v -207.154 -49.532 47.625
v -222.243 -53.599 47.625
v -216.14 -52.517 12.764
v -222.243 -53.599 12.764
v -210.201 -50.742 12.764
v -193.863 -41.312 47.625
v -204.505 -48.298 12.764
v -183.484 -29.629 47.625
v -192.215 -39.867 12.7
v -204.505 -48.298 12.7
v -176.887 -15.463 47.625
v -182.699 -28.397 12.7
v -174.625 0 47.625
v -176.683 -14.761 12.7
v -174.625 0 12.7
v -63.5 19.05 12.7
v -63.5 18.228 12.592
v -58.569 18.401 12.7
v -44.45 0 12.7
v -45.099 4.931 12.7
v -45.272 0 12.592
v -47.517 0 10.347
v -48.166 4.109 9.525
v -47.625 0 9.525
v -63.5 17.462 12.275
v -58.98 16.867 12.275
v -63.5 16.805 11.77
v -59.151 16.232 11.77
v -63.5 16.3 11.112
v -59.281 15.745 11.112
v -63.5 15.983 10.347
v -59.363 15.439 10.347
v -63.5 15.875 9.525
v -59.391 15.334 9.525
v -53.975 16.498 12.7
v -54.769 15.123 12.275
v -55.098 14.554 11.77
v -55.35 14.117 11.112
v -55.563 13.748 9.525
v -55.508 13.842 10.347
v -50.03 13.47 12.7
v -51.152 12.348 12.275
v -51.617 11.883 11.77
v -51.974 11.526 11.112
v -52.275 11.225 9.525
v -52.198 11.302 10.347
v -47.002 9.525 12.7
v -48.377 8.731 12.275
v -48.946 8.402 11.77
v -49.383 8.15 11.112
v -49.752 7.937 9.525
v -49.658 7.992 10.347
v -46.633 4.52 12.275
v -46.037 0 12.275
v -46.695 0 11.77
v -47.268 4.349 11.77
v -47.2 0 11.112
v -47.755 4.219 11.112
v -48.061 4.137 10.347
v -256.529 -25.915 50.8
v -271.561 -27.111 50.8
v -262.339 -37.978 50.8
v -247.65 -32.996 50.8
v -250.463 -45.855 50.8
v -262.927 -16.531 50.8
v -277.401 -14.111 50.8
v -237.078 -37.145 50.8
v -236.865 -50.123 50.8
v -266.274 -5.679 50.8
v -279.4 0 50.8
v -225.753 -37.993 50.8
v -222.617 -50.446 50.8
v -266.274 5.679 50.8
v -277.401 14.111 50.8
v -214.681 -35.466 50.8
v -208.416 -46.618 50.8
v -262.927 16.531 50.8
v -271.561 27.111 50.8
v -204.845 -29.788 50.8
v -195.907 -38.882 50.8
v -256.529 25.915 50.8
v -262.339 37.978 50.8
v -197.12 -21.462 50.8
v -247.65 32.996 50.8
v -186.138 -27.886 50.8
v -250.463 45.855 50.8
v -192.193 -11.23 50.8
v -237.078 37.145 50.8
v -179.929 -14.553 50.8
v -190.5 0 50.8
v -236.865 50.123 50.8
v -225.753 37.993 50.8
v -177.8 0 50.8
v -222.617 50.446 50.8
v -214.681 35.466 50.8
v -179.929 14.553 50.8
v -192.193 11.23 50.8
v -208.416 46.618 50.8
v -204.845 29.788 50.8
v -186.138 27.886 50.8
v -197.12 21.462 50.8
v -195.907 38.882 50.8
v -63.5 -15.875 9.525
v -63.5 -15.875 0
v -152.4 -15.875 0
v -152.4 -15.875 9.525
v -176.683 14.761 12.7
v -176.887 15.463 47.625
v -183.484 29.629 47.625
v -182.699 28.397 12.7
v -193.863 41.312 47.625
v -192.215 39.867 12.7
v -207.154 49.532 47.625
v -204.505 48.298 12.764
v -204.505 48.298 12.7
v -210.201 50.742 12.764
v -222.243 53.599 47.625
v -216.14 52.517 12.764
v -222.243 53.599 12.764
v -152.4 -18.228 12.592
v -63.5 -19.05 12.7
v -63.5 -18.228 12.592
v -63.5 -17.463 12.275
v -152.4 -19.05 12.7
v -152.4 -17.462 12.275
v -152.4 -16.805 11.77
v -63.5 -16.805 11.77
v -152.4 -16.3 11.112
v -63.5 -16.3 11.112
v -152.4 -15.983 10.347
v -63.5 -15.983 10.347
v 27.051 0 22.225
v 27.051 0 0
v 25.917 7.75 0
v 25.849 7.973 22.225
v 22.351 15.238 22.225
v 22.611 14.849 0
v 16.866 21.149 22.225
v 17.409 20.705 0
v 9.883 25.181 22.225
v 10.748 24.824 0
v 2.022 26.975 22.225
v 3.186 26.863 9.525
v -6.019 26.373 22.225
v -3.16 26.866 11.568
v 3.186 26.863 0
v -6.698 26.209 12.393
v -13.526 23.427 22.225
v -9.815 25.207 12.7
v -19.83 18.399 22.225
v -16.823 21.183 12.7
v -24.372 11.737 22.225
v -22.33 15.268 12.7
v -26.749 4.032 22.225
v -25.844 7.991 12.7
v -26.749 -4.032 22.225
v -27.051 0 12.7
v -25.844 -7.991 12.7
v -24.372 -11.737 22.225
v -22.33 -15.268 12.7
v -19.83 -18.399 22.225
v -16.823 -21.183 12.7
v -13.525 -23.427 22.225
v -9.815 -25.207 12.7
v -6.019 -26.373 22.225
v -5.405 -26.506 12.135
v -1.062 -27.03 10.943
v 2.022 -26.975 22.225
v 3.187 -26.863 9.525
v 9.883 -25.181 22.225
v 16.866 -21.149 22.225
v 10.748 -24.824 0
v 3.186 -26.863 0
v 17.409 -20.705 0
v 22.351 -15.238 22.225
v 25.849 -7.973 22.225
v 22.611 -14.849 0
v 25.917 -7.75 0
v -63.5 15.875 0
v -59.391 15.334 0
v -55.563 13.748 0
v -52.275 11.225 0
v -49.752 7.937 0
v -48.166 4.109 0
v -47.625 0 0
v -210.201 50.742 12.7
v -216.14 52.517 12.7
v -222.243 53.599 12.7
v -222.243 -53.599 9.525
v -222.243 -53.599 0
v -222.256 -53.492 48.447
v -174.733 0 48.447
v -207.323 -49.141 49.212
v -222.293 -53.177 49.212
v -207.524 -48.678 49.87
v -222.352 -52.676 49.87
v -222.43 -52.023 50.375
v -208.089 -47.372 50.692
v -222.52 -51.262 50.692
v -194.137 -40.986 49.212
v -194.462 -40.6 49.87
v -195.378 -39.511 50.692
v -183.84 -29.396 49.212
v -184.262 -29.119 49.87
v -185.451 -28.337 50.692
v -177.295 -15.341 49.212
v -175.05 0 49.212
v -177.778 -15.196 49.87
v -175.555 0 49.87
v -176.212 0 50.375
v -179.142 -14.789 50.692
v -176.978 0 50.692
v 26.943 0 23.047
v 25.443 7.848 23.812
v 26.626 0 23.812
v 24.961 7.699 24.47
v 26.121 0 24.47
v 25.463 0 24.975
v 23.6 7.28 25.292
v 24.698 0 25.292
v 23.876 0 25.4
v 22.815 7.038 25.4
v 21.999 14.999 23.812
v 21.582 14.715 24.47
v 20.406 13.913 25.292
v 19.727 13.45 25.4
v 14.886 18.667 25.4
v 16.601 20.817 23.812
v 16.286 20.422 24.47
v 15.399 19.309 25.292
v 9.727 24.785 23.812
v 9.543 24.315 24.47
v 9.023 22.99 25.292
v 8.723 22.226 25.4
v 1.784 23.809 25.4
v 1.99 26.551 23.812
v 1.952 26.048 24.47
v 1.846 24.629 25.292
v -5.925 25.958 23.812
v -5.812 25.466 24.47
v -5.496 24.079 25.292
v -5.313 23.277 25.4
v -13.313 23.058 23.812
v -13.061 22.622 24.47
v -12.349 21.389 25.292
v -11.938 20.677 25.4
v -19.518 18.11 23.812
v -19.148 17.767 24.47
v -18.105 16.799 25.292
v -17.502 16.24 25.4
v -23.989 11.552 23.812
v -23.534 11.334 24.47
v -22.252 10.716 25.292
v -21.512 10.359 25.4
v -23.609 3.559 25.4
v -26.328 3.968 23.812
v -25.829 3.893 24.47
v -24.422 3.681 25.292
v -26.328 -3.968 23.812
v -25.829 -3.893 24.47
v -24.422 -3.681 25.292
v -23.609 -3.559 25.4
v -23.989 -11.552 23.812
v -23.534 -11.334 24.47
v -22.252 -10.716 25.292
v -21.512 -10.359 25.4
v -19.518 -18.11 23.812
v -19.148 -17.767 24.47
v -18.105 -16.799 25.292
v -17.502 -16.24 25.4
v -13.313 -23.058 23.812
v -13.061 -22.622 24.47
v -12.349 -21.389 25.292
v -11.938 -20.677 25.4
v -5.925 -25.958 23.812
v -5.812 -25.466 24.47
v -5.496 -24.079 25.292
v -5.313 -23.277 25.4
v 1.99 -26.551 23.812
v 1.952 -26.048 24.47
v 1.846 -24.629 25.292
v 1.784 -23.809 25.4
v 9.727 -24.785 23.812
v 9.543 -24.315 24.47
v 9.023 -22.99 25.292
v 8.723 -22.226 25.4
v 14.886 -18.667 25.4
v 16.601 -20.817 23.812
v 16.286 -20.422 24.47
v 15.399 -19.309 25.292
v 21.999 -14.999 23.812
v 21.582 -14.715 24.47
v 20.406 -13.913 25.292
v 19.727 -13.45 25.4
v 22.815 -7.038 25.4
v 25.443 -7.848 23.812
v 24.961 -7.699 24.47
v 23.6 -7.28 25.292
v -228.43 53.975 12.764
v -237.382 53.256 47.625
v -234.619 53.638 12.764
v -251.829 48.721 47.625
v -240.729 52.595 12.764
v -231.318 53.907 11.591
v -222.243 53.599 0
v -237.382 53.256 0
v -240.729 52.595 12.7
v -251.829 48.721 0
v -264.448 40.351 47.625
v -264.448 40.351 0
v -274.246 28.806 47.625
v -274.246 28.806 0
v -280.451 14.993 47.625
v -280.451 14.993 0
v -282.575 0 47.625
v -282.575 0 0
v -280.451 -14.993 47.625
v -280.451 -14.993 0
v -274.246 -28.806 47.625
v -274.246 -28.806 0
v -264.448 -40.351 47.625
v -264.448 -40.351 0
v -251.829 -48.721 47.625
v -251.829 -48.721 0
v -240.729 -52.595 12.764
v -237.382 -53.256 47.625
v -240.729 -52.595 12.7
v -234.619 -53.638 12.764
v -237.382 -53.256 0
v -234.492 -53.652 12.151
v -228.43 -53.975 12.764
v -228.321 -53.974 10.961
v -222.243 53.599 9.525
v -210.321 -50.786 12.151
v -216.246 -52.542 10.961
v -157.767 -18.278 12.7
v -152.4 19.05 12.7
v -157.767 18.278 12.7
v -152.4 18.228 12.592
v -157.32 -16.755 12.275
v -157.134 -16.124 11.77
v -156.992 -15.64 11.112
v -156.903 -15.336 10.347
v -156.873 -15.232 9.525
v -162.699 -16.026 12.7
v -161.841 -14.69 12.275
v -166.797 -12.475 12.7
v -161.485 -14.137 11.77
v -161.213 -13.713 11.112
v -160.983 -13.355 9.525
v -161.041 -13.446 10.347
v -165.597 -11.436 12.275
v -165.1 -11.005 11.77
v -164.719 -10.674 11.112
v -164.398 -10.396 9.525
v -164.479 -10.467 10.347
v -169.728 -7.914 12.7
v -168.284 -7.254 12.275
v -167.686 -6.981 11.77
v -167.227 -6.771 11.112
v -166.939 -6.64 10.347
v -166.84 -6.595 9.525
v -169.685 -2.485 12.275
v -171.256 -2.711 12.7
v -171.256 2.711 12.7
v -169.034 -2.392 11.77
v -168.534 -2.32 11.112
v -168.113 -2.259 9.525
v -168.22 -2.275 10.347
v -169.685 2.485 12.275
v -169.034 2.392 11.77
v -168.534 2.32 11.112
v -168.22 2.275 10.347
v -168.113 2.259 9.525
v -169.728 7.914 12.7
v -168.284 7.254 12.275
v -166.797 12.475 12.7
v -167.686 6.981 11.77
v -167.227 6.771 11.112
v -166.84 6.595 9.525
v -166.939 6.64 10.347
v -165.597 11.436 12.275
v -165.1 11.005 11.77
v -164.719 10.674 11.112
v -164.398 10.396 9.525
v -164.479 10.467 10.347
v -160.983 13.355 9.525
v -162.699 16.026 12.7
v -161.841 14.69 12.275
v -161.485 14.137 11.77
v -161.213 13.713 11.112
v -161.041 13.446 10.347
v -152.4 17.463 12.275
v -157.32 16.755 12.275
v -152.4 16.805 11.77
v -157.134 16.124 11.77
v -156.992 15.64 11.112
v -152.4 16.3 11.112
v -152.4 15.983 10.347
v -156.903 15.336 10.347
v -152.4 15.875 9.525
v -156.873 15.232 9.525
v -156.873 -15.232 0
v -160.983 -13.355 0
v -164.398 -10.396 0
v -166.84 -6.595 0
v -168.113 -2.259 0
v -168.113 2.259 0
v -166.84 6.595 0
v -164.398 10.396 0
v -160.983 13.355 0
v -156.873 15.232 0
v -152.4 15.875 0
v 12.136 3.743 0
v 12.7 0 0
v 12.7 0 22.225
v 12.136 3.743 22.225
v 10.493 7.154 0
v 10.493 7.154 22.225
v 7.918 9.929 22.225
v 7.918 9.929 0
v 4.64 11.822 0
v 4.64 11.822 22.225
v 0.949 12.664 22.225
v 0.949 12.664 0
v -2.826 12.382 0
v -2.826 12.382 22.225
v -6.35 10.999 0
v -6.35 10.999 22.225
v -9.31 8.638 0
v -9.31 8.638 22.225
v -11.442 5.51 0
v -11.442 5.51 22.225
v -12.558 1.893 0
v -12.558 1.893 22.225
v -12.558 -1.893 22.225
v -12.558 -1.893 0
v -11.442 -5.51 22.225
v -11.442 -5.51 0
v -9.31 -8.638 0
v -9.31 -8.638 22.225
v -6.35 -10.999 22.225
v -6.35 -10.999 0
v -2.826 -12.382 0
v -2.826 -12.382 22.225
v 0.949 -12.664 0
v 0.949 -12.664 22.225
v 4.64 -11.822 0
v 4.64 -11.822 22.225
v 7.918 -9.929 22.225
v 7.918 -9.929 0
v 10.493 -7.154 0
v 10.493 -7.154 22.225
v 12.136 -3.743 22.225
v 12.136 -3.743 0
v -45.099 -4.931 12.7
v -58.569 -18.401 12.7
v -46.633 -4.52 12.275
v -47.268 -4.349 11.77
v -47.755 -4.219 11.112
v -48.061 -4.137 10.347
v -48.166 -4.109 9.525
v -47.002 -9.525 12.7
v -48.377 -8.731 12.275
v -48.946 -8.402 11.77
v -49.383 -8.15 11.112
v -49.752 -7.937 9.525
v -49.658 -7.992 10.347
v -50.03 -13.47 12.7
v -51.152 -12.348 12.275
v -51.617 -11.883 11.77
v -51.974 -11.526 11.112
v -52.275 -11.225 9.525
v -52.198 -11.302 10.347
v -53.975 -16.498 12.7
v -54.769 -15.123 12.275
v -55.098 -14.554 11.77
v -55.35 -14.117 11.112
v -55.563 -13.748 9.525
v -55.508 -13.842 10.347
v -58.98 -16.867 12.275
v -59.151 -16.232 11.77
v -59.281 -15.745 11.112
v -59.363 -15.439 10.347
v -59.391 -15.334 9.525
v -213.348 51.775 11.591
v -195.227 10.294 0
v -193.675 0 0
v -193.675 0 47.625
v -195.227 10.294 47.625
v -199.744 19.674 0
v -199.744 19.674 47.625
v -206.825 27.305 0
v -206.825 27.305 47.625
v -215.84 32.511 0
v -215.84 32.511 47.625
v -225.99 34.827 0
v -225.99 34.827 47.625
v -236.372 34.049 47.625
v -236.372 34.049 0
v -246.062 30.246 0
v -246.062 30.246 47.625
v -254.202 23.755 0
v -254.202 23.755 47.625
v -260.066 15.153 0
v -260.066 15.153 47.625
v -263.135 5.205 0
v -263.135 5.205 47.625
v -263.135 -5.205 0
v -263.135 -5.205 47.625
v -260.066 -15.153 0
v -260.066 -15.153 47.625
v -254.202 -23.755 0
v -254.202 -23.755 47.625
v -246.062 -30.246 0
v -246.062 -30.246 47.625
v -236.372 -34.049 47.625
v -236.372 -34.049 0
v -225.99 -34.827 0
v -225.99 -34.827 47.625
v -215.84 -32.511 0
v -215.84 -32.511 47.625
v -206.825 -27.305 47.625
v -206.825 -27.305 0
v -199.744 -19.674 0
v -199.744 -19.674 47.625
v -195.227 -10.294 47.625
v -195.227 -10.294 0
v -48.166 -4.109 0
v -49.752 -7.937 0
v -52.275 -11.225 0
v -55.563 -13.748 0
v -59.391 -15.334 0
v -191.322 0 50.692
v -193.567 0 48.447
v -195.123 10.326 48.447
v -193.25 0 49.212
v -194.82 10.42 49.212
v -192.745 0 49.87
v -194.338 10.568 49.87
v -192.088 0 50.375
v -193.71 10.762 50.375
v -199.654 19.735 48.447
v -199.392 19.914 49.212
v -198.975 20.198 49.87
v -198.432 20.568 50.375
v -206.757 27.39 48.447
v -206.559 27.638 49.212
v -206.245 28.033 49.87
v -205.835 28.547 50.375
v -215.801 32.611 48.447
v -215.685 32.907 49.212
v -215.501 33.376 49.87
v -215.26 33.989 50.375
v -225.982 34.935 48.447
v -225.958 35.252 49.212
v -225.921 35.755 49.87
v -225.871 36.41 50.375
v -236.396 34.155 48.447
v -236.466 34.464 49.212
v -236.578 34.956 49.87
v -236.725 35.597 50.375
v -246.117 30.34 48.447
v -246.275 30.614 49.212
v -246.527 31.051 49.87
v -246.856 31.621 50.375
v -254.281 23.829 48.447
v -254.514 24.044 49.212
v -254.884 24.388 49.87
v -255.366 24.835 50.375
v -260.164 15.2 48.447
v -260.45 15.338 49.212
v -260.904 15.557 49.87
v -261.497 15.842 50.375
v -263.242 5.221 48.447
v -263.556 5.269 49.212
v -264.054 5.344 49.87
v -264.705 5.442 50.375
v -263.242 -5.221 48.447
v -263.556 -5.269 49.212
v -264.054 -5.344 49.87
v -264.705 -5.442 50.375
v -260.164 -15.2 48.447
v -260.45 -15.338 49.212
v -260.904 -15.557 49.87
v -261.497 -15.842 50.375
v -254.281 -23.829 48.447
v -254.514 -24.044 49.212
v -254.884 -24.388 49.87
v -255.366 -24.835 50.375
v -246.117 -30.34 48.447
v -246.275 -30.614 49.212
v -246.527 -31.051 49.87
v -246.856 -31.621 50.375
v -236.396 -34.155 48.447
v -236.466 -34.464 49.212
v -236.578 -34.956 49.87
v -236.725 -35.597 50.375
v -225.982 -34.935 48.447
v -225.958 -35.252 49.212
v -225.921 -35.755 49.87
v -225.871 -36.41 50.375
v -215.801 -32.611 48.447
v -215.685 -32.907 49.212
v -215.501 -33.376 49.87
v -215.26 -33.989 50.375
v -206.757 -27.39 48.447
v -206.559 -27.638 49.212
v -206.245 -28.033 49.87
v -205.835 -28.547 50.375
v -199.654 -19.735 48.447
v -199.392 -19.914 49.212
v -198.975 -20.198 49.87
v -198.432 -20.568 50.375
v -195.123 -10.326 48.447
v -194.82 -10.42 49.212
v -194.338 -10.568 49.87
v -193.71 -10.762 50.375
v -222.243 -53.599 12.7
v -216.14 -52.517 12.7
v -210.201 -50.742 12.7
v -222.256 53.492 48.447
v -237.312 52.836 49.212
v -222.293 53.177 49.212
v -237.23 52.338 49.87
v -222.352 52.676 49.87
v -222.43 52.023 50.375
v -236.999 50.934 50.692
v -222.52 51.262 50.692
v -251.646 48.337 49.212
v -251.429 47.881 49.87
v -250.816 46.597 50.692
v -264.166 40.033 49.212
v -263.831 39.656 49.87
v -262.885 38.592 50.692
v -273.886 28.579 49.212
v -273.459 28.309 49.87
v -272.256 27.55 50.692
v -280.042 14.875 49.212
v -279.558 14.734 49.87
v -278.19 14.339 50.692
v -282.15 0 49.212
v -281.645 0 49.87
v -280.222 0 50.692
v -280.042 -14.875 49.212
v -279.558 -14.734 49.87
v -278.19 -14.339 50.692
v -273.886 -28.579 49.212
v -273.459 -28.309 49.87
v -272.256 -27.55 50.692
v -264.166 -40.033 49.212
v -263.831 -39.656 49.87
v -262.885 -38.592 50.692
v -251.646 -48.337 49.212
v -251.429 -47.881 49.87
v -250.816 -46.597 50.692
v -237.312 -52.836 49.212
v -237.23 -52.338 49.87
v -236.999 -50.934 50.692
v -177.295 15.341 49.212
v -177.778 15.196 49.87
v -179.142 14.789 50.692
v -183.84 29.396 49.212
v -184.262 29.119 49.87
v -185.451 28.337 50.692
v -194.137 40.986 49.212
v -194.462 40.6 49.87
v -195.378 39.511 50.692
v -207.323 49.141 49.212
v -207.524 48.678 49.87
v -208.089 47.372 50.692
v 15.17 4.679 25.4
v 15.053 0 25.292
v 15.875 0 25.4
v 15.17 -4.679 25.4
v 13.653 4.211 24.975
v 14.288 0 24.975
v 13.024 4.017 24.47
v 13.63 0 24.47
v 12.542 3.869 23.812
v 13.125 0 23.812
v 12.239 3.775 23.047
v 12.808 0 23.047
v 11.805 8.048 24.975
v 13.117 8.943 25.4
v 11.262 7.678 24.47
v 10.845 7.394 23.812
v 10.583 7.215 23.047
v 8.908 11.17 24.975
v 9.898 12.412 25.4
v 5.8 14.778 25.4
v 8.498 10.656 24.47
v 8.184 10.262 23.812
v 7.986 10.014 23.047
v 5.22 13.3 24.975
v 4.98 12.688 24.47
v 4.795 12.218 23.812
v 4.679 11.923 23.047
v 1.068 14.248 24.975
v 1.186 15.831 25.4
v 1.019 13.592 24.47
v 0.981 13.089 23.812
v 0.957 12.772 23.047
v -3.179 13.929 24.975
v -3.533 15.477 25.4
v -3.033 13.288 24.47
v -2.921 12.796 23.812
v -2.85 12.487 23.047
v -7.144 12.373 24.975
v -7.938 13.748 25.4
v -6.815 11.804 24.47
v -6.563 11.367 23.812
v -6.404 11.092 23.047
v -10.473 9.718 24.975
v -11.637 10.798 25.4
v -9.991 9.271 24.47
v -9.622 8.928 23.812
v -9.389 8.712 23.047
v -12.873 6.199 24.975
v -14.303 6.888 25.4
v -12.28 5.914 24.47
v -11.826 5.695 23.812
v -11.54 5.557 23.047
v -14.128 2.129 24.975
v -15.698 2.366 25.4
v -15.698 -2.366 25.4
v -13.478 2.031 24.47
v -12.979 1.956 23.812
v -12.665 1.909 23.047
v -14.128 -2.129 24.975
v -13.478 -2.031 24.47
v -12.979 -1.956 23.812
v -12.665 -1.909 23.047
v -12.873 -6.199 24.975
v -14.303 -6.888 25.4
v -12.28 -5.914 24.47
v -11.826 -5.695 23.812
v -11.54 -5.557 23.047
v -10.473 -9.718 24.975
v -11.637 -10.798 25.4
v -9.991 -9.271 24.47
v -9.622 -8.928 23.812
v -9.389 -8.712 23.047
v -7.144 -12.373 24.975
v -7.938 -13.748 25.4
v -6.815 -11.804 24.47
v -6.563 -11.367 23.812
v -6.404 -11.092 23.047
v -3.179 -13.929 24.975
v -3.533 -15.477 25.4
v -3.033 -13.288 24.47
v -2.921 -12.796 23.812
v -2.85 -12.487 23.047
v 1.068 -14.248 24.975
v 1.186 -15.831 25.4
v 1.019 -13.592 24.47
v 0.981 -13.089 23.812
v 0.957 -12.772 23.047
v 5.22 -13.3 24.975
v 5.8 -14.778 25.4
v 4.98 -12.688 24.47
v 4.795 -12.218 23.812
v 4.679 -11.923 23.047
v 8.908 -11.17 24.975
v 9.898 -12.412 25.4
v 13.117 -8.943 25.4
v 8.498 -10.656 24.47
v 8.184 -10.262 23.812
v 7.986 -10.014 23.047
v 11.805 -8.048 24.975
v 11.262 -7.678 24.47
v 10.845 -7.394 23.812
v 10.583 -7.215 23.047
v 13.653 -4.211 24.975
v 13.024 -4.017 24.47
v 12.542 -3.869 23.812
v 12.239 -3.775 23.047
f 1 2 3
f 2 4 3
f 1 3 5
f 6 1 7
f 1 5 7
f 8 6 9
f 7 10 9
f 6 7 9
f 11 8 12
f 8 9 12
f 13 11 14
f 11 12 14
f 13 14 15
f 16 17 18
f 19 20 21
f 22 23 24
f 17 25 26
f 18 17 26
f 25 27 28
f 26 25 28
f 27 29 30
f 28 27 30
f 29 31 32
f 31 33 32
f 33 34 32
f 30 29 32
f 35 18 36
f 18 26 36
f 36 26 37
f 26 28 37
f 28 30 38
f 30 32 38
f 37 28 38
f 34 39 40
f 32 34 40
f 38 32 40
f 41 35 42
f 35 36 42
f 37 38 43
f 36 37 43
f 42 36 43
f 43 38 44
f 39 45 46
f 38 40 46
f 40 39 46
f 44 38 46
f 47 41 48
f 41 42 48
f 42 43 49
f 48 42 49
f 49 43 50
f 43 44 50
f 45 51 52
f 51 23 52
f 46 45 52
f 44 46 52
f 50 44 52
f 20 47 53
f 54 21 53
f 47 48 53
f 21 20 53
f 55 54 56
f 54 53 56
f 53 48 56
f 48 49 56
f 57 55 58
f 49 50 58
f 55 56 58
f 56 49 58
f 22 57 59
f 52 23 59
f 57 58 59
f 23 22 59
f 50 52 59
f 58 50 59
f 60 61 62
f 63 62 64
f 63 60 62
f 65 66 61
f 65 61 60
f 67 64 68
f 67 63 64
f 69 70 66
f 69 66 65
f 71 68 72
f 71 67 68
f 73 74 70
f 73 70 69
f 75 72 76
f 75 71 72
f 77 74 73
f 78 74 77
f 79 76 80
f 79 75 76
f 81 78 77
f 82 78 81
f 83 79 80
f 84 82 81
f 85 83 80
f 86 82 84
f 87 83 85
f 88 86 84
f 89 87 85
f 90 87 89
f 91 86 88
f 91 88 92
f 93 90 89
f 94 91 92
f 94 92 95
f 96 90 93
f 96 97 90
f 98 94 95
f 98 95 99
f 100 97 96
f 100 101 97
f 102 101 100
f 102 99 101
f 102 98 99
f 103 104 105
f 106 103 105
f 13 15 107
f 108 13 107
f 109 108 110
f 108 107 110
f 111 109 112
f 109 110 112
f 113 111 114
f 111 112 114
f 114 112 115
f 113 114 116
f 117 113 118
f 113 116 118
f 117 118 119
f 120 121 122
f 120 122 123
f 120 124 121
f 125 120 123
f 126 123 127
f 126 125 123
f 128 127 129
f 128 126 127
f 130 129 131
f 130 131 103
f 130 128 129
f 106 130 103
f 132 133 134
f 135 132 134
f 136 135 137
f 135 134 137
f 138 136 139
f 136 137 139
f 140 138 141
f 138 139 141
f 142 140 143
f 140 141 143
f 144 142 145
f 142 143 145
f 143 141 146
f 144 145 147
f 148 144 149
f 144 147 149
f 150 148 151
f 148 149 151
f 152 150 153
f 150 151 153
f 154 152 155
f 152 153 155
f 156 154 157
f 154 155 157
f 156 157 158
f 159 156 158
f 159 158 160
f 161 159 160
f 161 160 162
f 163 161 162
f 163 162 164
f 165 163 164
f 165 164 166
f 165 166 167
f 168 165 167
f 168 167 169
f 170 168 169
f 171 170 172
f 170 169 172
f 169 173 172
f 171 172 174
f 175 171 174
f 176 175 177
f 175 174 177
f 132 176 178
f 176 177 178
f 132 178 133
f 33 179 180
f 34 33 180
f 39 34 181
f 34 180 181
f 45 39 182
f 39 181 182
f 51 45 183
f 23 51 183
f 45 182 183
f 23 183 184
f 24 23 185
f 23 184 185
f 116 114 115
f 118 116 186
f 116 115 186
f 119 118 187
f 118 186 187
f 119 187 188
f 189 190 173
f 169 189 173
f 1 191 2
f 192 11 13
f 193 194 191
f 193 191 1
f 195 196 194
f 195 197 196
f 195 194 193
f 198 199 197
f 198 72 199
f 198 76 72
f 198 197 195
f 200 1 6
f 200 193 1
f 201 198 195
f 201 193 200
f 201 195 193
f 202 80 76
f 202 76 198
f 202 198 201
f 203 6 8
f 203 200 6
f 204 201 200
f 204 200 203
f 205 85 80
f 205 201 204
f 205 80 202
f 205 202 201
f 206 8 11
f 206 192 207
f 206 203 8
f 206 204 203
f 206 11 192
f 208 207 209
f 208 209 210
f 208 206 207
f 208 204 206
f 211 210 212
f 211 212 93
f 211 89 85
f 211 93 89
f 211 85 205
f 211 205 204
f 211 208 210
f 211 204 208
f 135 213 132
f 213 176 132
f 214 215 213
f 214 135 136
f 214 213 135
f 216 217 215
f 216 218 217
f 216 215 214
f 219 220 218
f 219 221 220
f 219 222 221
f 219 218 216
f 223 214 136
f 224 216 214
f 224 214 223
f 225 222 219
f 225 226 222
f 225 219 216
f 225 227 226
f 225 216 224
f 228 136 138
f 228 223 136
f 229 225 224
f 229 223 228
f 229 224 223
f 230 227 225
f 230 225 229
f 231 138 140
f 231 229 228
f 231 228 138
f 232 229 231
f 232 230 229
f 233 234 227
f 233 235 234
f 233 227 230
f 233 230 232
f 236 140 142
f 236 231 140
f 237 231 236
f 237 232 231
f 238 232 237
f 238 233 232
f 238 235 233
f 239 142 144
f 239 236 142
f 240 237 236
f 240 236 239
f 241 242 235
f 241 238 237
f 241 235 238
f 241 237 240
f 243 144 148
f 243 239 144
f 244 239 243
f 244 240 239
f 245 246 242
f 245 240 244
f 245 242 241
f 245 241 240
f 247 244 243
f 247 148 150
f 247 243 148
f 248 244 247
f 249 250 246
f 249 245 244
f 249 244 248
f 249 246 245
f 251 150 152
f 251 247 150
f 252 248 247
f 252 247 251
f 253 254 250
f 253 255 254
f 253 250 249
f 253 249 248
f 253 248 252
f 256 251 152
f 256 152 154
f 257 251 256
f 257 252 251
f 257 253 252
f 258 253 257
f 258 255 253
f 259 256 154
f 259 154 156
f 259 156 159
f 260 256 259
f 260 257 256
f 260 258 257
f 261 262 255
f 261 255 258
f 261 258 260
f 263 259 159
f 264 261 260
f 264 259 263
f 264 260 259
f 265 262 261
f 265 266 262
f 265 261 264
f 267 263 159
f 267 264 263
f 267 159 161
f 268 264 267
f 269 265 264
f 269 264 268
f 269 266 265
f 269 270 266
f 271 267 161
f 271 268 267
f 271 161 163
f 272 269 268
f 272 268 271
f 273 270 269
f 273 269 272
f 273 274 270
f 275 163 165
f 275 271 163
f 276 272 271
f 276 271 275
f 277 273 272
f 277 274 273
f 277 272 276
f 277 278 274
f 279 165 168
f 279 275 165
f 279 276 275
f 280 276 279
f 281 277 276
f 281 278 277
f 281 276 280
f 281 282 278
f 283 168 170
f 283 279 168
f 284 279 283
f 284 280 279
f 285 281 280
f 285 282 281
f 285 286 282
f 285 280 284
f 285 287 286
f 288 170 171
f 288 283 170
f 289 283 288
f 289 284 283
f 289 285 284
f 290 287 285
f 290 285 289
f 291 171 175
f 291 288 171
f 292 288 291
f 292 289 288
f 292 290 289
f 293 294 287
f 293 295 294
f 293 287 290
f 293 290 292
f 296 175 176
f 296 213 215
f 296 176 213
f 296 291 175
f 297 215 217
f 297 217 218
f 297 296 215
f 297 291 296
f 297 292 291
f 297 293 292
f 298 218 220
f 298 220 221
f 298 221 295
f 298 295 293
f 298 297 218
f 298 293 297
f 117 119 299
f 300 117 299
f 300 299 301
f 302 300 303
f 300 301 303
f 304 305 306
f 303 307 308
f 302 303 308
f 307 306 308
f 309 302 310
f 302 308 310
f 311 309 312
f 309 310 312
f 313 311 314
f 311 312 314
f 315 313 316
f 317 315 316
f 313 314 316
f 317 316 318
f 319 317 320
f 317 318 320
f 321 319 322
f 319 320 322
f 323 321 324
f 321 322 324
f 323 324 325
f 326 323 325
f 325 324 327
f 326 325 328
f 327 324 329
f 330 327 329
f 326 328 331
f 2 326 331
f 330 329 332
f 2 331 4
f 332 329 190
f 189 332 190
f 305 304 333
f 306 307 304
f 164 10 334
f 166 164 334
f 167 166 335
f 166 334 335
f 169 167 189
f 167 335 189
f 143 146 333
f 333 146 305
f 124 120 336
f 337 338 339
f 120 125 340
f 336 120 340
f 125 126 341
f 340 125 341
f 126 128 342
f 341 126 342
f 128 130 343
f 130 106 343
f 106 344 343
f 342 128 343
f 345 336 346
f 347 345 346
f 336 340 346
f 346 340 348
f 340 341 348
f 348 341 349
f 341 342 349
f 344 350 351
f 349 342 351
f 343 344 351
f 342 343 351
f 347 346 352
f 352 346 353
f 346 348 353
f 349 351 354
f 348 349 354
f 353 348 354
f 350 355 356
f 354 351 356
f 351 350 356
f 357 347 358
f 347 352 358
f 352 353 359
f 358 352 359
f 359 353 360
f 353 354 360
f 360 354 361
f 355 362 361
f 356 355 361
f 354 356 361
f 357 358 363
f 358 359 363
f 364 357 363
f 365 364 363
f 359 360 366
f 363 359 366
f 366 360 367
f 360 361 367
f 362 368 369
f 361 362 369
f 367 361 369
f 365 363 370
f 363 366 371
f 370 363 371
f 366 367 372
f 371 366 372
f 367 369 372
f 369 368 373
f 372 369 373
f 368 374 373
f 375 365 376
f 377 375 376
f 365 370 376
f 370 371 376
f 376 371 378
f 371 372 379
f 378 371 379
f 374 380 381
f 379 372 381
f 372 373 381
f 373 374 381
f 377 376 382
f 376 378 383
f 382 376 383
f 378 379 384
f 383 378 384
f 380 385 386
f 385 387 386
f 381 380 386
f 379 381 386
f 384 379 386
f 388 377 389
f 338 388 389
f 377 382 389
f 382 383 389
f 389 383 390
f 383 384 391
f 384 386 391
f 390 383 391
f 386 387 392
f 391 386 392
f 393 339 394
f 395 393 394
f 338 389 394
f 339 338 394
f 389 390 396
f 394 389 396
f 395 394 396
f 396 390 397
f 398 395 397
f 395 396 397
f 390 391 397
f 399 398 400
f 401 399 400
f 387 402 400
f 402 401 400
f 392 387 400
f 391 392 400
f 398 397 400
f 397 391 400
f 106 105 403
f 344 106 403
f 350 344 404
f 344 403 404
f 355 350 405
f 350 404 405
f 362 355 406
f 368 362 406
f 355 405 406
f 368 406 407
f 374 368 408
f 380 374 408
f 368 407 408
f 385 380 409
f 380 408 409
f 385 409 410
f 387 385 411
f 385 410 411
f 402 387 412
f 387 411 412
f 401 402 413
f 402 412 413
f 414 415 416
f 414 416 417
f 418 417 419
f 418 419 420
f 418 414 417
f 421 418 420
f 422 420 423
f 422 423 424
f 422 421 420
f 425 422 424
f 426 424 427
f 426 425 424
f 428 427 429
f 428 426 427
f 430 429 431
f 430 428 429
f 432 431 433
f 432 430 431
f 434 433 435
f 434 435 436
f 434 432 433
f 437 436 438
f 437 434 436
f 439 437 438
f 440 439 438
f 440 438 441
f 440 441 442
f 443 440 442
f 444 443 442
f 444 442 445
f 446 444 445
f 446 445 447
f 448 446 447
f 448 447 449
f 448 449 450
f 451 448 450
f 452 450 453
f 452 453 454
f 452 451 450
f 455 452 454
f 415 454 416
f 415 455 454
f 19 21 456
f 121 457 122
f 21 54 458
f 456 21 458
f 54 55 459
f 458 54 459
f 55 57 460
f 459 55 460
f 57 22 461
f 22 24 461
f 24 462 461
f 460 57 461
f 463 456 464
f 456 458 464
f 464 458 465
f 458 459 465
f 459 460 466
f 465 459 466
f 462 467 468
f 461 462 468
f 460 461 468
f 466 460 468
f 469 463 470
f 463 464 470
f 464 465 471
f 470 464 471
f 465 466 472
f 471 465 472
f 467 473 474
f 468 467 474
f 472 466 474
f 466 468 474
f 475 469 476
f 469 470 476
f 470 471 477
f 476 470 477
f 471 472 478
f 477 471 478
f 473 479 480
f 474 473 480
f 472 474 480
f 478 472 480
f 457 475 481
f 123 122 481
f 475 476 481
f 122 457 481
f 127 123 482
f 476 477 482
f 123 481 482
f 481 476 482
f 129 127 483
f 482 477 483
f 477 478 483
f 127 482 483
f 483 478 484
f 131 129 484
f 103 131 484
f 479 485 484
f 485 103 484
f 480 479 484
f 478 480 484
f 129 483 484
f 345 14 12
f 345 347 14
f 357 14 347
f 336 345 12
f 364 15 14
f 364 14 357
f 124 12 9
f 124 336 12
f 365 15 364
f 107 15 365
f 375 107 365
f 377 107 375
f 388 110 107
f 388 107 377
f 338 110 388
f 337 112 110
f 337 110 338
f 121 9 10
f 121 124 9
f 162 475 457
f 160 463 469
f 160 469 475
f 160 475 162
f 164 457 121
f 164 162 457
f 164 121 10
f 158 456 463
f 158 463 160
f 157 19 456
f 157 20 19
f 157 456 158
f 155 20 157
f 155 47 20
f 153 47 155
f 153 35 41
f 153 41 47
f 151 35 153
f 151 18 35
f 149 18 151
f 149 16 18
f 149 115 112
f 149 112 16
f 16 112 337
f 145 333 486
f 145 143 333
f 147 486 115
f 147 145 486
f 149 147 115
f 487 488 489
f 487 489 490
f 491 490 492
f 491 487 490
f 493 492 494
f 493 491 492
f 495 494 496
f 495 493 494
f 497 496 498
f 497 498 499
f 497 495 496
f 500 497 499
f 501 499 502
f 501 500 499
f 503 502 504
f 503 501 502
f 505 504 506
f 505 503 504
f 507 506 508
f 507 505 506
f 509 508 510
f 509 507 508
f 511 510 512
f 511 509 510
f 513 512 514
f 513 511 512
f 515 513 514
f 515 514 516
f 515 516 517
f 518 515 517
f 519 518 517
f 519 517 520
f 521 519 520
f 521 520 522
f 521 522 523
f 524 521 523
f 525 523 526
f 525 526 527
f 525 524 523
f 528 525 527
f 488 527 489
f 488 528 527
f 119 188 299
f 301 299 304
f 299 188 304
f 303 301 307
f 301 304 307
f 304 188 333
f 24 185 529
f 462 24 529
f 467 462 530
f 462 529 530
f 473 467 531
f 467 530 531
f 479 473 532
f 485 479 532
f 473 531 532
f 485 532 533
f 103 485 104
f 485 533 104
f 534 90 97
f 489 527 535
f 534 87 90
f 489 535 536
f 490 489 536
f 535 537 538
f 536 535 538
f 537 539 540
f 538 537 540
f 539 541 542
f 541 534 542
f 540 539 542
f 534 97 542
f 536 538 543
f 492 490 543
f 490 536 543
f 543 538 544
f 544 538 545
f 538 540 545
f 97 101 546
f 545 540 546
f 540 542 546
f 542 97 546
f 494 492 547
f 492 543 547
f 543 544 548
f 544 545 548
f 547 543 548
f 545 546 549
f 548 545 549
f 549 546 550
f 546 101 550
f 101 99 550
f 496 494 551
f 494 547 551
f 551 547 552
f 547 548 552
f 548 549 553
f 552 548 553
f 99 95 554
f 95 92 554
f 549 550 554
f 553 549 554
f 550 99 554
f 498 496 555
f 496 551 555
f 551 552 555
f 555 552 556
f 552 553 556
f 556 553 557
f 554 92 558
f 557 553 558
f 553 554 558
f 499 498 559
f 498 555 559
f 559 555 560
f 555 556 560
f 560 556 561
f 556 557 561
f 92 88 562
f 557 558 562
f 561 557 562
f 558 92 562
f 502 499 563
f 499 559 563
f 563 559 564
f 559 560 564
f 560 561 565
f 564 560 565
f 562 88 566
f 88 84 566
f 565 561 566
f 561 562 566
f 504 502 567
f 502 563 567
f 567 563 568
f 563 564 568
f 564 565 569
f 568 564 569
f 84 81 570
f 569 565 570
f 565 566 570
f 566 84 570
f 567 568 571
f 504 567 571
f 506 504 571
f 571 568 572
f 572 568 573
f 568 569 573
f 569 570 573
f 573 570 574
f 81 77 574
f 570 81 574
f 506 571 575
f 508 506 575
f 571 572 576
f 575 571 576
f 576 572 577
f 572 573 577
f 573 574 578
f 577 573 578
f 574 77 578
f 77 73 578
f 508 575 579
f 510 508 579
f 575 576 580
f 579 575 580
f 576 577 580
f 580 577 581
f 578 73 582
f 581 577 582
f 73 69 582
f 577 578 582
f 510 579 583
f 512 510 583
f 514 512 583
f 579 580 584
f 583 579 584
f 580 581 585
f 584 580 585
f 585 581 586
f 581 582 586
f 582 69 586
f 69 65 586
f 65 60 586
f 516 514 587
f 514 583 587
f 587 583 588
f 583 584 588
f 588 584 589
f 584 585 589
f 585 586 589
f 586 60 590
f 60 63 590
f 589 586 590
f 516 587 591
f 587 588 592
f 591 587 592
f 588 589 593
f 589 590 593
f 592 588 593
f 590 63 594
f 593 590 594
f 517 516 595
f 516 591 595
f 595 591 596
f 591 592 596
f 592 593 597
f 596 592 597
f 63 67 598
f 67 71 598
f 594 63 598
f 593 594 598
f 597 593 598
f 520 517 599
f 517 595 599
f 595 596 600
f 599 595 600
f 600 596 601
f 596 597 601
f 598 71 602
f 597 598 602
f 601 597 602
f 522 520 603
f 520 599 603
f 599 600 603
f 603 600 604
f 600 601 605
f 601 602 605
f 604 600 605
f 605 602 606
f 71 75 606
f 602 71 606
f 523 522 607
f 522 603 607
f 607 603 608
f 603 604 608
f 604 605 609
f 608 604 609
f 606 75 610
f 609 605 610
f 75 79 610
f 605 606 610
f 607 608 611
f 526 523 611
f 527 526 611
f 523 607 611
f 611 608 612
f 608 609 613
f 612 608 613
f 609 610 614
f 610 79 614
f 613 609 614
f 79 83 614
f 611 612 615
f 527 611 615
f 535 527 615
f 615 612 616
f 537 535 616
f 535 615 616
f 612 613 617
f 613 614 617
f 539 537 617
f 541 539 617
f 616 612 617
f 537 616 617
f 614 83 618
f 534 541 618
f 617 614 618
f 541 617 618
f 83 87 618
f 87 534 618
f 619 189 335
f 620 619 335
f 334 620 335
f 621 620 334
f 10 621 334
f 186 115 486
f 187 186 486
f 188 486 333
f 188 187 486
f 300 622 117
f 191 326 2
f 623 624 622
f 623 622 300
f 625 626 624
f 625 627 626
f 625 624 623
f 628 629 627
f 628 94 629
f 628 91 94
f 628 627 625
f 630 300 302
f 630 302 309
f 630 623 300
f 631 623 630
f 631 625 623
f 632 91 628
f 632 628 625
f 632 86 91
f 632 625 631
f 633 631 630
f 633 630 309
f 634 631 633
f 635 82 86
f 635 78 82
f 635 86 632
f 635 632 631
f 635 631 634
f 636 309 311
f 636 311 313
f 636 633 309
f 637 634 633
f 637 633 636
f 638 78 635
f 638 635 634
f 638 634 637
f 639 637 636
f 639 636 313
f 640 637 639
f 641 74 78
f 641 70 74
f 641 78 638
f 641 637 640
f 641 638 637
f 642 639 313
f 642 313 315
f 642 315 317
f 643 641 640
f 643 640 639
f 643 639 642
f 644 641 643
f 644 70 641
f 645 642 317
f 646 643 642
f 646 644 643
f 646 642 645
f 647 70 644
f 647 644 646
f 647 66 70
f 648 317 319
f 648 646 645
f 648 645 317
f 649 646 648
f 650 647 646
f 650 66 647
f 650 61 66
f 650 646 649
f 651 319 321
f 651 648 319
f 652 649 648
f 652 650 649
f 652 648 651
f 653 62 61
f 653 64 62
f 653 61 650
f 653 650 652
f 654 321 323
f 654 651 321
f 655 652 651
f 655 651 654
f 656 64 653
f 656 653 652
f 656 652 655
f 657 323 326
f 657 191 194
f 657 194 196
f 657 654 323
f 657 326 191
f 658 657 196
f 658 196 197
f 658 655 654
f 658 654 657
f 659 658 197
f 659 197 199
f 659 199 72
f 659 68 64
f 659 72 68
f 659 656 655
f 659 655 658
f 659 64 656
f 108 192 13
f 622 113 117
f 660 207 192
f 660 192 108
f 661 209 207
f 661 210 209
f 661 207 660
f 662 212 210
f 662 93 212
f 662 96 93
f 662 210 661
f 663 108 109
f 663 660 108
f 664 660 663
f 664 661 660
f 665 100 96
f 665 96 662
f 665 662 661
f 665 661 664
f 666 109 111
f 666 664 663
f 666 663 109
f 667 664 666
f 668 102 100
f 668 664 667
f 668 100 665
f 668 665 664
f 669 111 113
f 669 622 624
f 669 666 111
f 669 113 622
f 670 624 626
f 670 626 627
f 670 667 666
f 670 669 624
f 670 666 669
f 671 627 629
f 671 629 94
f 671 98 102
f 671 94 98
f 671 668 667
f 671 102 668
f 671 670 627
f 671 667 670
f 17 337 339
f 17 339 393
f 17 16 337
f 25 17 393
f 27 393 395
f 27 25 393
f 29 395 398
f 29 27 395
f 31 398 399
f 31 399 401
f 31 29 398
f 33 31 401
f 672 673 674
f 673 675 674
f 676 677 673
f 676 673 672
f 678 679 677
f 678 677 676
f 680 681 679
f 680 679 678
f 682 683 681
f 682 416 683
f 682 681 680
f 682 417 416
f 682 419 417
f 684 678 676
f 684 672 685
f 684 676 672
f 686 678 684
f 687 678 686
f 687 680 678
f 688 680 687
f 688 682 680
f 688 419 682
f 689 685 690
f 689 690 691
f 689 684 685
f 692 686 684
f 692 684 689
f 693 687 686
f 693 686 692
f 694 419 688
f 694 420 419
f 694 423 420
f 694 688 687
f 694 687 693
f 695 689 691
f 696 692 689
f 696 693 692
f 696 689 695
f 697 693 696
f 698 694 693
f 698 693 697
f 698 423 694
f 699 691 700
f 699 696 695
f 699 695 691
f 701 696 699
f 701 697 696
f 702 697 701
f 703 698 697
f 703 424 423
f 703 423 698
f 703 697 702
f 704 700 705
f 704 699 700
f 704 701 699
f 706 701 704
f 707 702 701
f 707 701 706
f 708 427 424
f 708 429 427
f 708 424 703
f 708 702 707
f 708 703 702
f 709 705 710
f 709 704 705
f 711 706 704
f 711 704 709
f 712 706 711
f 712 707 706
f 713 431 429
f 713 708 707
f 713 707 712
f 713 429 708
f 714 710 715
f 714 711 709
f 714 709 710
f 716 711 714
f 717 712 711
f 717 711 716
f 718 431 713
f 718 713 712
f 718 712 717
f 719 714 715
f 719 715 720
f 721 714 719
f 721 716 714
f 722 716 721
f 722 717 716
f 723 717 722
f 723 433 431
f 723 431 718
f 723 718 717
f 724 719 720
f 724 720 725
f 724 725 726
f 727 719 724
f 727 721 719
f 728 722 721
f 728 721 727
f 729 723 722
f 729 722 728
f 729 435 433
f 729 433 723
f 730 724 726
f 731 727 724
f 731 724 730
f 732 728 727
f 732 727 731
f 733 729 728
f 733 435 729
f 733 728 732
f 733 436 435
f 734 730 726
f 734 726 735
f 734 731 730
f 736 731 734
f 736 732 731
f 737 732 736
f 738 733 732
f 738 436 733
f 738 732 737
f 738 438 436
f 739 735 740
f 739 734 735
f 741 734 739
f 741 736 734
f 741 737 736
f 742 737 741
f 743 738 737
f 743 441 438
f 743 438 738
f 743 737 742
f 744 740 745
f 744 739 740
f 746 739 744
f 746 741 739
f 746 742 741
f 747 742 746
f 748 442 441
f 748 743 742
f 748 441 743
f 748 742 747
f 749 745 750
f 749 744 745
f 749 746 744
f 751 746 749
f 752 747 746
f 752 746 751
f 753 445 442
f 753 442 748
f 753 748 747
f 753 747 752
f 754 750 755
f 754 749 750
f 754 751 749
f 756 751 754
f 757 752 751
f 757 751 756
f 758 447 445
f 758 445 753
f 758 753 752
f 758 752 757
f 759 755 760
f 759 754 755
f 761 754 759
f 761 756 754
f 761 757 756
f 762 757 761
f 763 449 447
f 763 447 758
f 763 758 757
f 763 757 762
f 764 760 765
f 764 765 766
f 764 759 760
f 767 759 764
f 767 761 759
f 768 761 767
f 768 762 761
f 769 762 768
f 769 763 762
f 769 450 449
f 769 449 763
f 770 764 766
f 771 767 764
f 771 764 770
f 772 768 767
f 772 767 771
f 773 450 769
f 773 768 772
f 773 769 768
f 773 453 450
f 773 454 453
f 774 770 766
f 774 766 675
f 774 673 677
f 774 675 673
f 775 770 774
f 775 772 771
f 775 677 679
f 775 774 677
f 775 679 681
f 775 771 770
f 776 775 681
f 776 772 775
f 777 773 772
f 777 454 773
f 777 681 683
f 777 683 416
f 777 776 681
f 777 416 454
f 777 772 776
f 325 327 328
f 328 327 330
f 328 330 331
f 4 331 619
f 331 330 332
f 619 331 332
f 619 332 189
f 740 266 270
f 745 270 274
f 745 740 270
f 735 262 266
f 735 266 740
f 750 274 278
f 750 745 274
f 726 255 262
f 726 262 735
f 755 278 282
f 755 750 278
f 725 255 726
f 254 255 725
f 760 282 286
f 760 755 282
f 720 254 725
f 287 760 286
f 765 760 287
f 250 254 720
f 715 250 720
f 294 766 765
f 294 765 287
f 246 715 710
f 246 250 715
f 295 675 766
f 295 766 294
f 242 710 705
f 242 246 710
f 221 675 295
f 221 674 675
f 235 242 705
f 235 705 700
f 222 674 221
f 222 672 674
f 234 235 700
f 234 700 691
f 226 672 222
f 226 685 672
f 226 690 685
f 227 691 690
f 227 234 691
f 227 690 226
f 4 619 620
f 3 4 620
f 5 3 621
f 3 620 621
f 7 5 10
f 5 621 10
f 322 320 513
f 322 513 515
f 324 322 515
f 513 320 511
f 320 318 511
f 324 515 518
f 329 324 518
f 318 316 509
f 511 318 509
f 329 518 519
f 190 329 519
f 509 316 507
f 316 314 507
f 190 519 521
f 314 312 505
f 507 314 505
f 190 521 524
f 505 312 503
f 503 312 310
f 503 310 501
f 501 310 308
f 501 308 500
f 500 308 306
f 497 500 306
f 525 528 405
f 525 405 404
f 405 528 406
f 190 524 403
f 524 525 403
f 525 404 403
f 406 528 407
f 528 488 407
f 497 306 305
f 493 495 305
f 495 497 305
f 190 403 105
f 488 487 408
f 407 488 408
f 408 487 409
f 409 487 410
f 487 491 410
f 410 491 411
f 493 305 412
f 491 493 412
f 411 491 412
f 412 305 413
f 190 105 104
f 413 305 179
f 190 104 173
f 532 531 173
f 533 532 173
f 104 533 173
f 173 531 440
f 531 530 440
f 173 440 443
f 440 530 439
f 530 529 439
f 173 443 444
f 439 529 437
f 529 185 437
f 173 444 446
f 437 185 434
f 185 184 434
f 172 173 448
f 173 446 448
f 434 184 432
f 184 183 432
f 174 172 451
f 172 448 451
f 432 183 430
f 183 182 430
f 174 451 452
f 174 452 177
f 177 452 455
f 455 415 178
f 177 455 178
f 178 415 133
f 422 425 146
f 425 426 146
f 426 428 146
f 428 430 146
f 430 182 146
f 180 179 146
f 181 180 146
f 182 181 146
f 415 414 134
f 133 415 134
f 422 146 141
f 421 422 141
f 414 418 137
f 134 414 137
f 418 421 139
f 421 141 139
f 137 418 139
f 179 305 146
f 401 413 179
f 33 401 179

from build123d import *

# Parameters (mm, degrees)
F0_R         = 34.925
F1_DEPTH     = 50.8
F2_DEPTH     = 12.7
F0_R_2       = 12.7
F3_DEPTH     = 25.4
F4_F1_R      = 3.175
F4_F2_R      = 3.175
F4_F3_R      = 3.175
F4_F4_R      = 3.175
F4_F5_R      = 3.175
F4_T9_DEPTH  = 264.3151886434
F4_S10_R     = 27.051
F4_T11_DEPTH = 134
F4_S12_R     = 53.975
F4_T13_DEPTH = 134
F4_T17_DEPTH = 264.3151886434
F4_S18_R     = 27.051
F4_T19_DEPTH = 134
F4_S20_R     = 53.975
F4_T21_DEPTH = 134


# Not quite as in the source:
# - a fillet or chamfer that OpenCascade refuses, or shapes differently, is made with other operations: its cross-section is extruded or revolved along the edge and cut away or added


with BuildPart() as f1:
    # F0 (on Top) → F1 (new body)
    with BuildSketch(Plane.XY):
        with BuildLine():
            ThreePointArc((-174.625, 0), (-188.2488990323, 35.8481418723), (-222.2429444444, 53.5993327352))
            ThreePointArc((-222.2429444444, 53.5993327352), (-282.575, 0), (-222.2429444444, -53.5993327352))
            ThreePointArc((-222.2429444444, -53.5993327352), (-188.2488990323, -35.8481418723), (-174.625, 0))
        make_face()
        with Locations((-228.6, 0)):
            Circle(F0_R, mode=Mode.SUBTRACT)
    extrude(amount=F1_DEPTH)

    # F0 (on Top) → F2 (join)
    with BuildSketch(Plane.XY):
        with BuildLine():
            ThreePointArc((3.1860066667, -26.8627244061), (-27.051, 0), (3.1860066667, 26.8627244061))
            Line((3.1860066667, 26.8627244061), (-222.2429444444, 53.5993327352))
            ThreePointArc((-222.2429444444, 53.5993327352), (-188.2488990323, 35.8481418723), (-174.625, 0))
            ThreePointArc((-174.625, 0), (-188.2488990323, -35.8481418723), (-222.2429444444, -53.5993327352))
            Line((-222.2429444444, -53.5993327352), (3.1860066667, -26.8627244061))
        make_face()
        with BuildLine():
            ThreePointArc((-63.5, 15.875), (-52.2746798487, 11.2253201513), (-47.625, 0))
            ThreePointArc((-47.625, 0), (-52.2746798487, -11.2253201513), (-63.5, -15.875))
            Line((-63.5, -15.875), (-152.4, -15.875))
            ThreePointArc((-152.4, -15.875), (-168.275, 0), (-152.4, 15.875))
            Line((-152.4, 15.875), (-63.5, 15.875))
        make_face(mode=Mode.SUBTRACT)
    extrude(amount=F2_DEPTH)

    # F0 (on Top) → F3 (join)
    with BuildSketch(Plane.XY):
        with BuildLine():
            ThreePointArc((3.1860066667, -26.8627244061), (20.2230223673, -17.9662452207), (27.051, 0))
            ThreePointArc((27.051, 0), (20.2230223673, 17.9662452207), (3.1860066667, 26.8627244061))
            ThreePointArc((3.1860066667, 26.8627244061), (-27.051, 0), (3.1860066667, -26.8627244061))
        make_face()
        Circle(F0_R_2, mode=Mode.SUBTRACT)
    extrude(amount=F3_DEPTH)

    # F4: fillet of radius 3.175 on 10 edges, made by hand

    # F4_f1
    f4_f1_edges = [f1.edges().sort_by_distance(p)[0] for p in [
        (-234.9570555556, 53.5993327352, 50.8),
    ]]
    fillet(f4_f1_edges, radius=F4_F1_R)

    # F4_f2
    f4_f2_edges = [f1.edges().sort_by_distance(p)[0] for p in [
        (-47.625, 0, 12.7),
        (-107.95, -15.875, 12.7),
        (-168.275, 0, 12.7),
        (-107.95, 15.875, 12.7),
    ]]
    fillet(f4_f2_edges, radius=F4_F2_R)

    # F4_f3
    f4_f3_edges = [f1.edges().sort_by_distance(p)[0] for p in [
        (-263.525, 0, 50.8),
    ]]
    fillet(f4_f3_edges, radius=F4_F3_R)

    # F4_f4
    f4_f4_edges = [f1.edges().sort_by_distance(p)[0] for p in [
        (-3.1860066667, 26.8627244061, 25.4),
    ]]
    fillet(f4_f4_edges, radius=F4_F4_R)

    # F4_f5
    f4_f5_edges = [f1.edges().sort_by_distance(p)[0] for p in [
        (-12.7, 0, 25.4),
    ]]
    fillet(f4_f5_edges, radius=F4_F5_R)


with BuildPart() as f4_tool7:
    # F4_s8 → F4_t9 (new body)
    with BuildSketch(Plane(origin=(-249.0757155531, -29.5411916624, 0), x_dir=(0, 0, 1), z_dir=(0.9930399766, 0.1177777778, 0))):
        with BuildLine():
            ThreePointArc((12.7, 23.876), (11.7700640303, 26.1210640303), (9.525, 27.051))
            Line((9.525, 27.051), (9.525, 27.1145))
            Line((9.525, 27.1145), (12.7635, 27.1145))
            Line((12.7635, 27.1145), (12.7635, 23.876))
            Line((12.7635, 23.876), (12.7, 23.876))
        make_face()
    extrude(amount=F4_T9_DEPTH)

    # F4_s10 → F4_t11 (cut, symmetric)
    with BuildSketch(Plane.XY.offset(11.1)):
        Circle(F4_S10_R)
    extrude(amount=F4_T11_DEPTH, both=True, mode=Mode.SUBTRACT)

    # F4_s12 → F4_t13 (cut, symmetric)
    with BuildSketch(Plane.XY.offset(11.1)):
        with Locations((-228.6, 0)):
            Circle(F4_S12_R)
    extrude(amount=F4_T13_DEPTH, both=True, mode=Mode.SUBTRACT)


with BuildPart() as f1_1:
    add(f1.part)

    # F4_t6: cut F4_tool7
    add(f4_tool7.part, mode=Mode.SUBTRACT)


with BuildPart() as f4_tool15:
    # F4_s16 → F4_t17 (new body)
    with BuildSketch(Plane(origin=(13.3998331838, -1.5892638889, 0), x_dir=(0, 0, 1), z_dir=(-0.9930399766, 0.1177777778, 0))):
        with BuildLine():
            ThreePointArc((9.525, 27.051), (11.7700640303, 26.1210640303), (12.7, 23.876))
            Line((12.7, 23.876), (12.7635, 23.876))
            Line((12.7635, 23.876), (12.7635, 27.1145))
            Line((12.7635, 27.1145), (9.525, 27.1145))
            Line((9.525, 27.1145), (9.525, 27.051))
        make_face()
    extrude(amount=F4_T17_DEPTH)

    # F4_s18 → F4_t19 (cut, symmetric)
    with BuildSketch(Plane.XY.offset(11.1)):
        Circle(F4_S18_R)
    extrude(amount=F4_T19_DEPTH, both=True, mode=Mode.SUBTRACT)

    # F4_s20 → F4_t21 (cut, symmetric)
    with BuildSketch(Plane.XY.offset(11.1)):
        with Locations((-228.6, 0)):
            Circle(F4_S20_R)
    extrude(amount=F4_T21_DEPTH, both=True, mode=Mode.SUBTRACT)


with BuildPart() as f1_2:
    add(f1_1.part)

    # F4_t14: cut F4_tool15
    add(f4_tool15.part, mode=Mode.SUBTRACT)


solid = f1_2.part
